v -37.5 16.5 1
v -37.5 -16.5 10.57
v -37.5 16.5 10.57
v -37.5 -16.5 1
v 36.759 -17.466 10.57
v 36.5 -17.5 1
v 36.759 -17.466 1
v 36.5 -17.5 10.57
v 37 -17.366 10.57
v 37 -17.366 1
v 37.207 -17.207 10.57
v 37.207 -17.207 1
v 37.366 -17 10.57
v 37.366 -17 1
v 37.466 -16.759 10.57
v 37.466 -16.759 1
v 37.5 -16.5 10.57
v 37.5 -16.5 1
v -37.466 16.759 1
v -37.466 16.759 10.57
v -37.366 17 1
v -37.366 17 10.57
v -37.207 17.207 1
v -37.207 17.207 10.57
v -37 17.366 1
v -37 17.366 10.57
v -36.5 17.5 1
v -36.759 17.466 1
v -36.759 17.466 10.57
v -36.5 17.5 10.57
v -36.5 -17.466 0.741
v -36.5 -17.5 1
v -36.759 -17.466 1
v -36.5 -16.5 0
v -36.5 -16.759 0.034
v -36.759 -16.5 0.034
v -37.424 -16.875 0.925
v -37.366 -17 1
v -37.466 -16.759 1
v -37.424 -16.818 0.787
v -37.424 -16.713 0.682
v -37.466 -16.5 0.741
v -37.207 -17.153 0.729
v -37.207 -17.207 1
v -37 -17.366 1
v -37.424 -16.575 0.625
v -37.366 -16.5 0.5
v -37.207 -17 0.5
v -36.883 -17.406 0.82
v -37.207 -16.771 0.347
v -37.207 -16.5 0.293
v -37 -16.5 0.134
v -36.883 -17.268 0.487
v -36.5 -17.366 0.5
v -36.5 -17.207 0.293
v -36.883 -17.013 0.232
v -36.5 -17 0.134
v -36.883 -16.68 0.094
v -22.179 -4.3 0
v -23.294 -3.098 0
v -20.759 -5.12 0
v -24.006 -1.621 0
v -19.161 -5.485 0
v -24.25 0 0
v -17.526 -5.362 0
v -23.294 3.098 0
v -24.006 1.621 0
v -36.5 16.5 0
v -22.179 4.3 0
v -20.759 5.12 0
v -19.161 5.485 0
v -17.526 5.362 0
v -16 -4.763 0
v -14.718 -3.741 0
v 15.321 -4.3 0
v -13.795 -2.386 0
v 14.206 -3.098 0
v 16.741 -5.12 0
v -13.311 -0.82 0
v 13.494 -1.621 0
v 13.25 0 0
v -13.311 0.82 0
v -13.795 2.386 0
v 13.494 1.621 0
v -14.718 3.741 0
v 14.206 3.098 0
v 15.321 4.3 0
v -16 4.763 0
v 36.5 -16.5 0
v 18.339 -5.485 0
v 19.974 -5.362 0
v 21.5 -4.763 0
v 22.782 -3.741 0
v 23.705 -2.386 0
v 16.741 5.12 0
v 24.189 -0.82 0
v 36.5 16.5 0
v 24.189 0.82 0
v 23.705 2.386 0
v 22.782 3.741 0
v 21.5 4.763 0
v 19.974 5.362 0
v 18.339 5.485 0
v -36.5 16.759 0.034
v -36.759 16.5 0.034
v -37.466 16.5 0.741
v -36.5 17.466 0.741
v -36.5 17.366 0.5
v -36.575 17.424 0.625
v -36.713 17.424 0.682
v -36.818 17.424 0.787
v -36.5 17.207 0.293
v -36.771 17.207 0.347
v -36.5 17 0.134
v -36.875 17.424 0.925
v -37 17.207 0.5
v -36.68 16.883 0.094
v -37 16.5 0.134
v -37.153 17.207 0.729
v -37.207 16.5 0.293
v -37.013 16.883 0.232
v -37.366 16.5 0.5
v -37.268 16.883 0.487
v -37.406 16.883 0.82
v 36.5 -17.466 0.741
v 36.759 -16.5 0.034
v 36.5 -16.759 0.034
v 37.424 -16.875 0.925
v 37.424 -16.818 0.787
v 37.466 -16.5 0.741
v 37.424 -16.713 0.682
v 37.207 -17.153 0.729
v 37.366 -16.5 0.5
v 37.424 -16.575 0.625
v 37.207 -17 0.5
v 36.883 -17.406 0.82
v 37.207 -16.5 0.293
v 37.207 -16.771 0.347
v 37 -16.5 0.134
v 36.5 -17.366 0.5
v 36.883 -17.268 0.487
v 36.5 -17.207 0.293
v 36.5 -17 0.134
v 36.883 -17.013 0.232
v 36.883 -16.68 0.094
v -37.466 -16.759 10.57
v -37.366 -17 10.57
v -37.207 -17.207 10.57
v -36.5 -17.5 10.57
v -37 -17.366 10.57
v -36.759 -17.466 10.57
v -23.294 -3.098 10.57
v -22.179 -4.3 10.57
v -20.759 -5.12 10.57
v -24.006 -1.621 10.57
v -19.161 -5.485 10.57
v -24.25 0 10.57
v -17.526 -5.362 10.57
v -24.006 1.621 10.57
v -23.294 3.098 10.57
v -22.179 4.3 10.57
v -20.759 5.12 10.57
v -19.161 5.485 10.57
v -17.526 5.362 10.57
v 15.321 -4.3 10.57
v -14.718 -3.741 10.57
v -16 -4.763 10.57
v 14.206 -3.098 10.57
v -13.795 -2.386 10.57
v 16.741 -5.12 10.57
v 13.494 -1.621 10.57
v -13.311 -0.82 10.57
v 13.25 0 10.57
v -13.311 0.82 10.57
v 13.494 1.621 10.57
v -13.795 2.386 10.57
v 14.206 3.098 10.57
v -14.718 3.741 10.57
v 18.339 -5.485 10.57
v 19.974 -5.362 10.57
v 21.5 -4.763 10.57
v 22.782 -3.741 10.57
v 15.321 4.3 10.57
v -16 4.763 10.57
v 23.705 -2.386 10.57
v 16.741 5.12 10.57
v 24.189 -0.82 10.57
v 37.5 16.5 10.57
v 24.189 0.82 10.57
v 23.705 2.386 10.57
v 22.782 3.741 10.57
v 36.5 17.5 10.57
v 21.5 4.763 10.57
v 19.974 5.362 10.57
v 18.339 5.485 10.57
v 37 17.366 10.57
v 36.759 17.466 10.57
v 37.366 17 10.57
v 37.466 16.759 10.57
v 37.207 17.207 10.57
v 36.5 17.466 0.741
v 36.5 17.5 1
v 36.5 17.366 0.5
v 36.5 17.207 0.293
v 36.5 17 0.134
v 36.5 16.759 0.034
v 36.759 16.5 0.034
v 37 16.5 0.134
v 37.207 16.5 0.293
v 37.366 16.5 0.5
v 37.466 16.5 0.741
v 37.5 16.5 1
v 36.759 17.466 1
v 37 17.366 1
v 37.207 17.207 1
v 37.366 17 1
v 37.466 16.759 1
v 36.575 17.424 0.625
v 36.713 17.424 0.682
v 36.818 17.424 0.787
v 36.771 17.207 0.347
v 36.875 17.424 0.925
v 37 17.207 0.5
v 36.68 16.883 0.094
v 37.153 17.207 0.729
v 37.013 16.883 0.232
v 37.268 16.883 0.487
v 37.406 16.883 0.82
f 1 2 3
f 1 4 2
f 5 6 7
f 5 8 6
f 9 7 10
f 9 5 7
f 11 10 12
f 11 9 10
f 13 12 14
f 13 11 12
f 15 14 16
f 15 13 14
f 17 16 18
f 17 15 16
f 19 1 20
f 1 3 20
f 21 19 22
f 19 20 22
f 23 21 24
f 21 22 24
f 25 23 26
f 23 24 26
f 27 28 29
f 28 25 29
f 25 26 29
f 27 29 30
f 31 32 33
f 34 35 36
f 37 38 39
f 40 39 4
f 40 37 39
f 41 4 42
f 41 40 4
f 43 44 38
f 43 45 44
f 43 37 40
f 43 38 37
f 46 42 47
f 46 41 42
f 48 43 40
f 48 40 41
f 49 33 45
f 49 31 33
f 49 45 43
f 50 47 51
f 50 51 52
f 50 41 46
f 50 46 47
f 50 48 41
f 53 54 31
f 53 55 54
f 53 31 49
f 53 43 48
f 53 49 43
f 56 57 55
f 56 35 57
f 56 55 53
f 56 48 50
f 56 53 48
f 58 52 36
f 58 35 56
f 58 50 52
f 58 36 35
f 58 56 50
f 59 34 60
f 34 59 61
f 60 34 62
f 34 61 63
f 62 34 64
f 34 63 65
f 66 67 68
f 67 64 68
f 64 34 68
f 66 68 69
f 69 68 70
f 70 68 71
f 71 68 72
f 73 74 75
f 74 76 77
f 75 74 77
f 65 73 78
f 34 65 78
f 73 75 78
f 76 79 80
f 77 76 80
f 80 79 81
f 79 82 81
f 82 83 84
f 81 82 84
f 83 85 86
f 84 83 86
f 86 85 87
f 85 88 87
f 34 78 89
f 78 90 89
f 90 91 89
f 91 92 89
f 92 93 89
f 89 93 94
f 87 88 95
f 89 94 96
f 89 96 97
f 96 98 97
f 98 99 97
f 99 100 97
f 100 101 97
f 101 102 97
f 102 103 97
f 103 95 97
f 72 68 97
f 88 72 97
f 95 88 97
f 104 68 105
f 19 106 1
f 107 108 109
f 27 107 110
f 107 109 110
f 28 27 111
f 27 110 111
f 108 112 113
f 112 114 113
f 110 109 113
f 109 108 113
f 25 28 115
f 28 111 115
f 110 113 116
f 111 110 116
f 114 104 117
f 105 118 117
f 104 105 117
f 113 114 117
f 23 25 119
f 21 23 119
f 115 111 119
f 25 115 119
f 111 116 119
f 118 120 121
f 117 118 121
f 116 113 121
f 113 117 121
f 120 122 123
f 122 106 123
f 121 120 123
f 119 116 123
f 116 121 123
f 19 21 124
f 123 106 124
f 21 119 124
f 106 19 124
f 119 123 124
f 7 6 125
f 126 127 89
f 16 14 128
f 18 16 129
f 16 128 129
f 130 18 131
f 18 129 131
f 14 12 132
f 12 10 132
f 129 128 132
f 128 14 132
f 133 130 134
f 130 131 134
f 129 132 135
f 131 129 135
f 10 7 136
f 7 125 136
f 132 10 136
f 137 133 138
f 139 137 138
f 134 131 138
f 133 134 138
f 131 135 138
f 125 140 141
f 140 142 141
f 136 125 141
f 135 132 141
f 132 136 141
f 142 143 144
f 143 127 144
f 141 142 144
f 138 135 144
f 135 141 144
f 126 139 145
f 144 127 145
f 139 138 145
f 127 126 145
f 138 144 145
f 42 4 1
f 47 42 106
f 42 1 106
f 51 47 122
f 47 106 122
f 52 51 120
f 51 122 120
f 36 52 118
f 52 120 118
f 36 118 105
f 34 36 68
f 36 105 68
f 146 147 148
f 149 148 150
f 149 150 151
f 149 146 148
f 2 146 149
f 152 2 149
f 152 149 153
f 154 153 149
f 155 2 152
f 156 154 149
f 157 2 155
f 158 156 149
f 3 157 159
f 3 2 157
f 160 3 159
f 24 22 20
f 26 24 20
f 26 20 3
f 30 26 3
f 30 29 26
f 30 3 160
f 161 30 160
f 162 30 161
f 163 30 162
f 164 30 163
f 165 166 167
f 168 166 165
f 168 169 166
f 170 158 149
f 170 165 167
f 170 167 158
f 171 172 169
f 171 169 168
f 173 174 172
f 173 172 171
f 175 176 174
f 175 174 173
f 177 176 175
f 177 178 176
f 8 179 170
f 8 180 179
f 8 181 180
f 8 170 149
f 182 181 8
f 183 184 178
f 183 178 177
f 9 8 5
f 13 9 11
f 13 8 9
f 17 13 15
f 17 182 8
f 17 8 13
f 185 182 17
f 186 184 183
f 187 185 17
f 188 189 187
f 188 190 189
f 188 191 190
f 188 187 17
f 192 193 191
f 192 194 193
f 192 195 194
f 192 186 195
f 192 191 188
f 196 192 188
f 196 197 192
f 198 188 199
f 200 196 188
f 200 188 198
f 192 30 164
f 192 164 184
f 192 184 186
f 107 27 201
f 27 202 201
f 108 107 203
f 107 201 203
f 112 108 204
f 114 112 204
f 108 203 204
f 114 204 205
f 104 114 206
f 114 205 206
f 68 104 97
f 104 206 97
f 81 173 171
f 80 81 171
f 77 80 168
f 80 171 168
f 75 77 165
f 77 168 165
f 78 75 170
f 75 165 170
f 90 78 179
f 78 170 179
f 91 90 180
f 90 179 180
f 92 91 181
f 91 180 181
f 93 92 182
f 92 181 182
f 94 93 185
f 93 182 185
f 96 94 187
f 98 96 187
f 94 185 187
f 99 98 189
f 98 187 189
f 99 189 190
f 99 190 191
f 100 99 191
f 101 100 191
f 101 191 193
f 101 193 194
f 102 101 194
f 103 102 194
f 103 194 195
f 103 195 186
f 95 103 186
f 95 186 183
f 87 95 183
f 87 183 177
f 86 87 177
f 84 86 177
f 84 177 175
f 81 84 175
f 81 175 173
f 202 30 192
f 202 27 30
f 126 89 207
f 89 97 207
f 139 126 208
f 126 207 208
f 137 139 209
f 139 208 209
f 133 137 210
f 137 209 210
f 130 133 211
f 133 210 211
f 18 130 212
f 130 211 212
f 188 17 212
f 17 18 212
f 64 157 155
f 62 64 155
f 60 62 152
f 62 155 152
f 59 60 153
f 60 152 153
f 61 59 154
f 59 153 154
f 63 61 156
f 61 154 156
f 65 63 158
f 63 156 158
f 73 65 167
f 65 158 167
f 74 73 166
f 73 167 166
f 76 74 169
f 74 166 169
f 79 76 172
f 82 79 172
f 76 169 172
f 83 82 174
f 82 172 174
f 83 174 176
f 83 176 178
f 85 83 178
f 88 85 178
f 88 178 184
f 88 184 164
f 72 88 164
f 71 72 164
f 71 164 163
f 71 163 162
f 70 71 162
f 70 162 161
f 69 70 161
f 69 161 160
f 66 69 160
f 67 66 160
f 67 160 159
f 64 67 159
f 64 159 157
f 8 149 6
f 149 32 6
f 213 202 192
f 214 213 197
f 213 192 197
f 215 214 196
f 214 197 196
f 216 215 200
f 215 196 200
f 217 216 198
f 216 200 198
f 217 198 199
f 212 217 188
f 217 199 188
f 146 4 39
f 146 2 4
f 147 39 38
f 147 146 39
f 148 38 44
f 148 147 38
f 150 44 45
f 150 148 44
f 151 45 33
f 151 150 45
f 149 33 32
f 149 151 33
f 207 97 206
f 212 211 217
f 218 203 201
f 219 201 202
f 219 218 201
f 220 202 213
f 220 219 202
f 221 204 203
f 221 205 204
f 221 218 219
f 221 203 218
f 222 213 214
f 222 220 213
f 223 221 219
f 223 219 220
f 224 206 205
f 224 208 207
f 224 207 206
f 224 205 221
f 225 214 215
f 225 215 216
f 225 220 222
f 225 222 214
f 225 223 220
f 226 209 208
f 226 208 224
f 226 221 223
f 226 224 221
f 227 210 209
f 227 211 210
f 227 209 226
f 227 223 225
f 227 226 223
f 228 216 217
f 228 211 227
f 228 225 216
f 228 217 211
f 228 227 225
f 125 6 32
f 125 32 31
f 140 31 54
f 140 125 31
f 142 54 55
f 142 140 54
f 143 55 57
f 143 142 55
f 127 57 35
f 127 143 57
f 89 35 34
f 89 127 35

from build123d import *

# Parameters (mm, degrees)
F0_W     = 75
F0_H     = 35
F1_DEPTH = 10.57
F2_D     = 11
F3_R     = 1


with BuildPart() as f1:
    # F0 (on Top) → F1 (new body)
    with BuildSketch(Plane.XY):
        Rectangle(F0_W, F0_H)
    extrude(amount=F1_DEPTH)

    # F2 (through all)
    with Locations(Plane(origin=(0, 0, 0), x_dir=(1, 0, 0), z_dir=(0, 0, -1))):
        with Locations((-18.75, 0), (18.75, 0)):
            Hole(F2_D / 2)

    # F3
    f3_edges = [f1.edges().sort_by_distance(p)[0] for p in [
        (0, -17.5, 0),
        (-37.5, -17.5, 5.285),
        (37.5, -17.5, 5.285),
        (37.5, 0, 0),
        (-37.5, 0, 0),
        (0, 17.5, 0),
        (-37.5, 17.5, 5.285),
        (37.5, 17.5, 5.285),
    ]]
    fillet(f3_edges, radius=F3_R)


solid = f1.part
